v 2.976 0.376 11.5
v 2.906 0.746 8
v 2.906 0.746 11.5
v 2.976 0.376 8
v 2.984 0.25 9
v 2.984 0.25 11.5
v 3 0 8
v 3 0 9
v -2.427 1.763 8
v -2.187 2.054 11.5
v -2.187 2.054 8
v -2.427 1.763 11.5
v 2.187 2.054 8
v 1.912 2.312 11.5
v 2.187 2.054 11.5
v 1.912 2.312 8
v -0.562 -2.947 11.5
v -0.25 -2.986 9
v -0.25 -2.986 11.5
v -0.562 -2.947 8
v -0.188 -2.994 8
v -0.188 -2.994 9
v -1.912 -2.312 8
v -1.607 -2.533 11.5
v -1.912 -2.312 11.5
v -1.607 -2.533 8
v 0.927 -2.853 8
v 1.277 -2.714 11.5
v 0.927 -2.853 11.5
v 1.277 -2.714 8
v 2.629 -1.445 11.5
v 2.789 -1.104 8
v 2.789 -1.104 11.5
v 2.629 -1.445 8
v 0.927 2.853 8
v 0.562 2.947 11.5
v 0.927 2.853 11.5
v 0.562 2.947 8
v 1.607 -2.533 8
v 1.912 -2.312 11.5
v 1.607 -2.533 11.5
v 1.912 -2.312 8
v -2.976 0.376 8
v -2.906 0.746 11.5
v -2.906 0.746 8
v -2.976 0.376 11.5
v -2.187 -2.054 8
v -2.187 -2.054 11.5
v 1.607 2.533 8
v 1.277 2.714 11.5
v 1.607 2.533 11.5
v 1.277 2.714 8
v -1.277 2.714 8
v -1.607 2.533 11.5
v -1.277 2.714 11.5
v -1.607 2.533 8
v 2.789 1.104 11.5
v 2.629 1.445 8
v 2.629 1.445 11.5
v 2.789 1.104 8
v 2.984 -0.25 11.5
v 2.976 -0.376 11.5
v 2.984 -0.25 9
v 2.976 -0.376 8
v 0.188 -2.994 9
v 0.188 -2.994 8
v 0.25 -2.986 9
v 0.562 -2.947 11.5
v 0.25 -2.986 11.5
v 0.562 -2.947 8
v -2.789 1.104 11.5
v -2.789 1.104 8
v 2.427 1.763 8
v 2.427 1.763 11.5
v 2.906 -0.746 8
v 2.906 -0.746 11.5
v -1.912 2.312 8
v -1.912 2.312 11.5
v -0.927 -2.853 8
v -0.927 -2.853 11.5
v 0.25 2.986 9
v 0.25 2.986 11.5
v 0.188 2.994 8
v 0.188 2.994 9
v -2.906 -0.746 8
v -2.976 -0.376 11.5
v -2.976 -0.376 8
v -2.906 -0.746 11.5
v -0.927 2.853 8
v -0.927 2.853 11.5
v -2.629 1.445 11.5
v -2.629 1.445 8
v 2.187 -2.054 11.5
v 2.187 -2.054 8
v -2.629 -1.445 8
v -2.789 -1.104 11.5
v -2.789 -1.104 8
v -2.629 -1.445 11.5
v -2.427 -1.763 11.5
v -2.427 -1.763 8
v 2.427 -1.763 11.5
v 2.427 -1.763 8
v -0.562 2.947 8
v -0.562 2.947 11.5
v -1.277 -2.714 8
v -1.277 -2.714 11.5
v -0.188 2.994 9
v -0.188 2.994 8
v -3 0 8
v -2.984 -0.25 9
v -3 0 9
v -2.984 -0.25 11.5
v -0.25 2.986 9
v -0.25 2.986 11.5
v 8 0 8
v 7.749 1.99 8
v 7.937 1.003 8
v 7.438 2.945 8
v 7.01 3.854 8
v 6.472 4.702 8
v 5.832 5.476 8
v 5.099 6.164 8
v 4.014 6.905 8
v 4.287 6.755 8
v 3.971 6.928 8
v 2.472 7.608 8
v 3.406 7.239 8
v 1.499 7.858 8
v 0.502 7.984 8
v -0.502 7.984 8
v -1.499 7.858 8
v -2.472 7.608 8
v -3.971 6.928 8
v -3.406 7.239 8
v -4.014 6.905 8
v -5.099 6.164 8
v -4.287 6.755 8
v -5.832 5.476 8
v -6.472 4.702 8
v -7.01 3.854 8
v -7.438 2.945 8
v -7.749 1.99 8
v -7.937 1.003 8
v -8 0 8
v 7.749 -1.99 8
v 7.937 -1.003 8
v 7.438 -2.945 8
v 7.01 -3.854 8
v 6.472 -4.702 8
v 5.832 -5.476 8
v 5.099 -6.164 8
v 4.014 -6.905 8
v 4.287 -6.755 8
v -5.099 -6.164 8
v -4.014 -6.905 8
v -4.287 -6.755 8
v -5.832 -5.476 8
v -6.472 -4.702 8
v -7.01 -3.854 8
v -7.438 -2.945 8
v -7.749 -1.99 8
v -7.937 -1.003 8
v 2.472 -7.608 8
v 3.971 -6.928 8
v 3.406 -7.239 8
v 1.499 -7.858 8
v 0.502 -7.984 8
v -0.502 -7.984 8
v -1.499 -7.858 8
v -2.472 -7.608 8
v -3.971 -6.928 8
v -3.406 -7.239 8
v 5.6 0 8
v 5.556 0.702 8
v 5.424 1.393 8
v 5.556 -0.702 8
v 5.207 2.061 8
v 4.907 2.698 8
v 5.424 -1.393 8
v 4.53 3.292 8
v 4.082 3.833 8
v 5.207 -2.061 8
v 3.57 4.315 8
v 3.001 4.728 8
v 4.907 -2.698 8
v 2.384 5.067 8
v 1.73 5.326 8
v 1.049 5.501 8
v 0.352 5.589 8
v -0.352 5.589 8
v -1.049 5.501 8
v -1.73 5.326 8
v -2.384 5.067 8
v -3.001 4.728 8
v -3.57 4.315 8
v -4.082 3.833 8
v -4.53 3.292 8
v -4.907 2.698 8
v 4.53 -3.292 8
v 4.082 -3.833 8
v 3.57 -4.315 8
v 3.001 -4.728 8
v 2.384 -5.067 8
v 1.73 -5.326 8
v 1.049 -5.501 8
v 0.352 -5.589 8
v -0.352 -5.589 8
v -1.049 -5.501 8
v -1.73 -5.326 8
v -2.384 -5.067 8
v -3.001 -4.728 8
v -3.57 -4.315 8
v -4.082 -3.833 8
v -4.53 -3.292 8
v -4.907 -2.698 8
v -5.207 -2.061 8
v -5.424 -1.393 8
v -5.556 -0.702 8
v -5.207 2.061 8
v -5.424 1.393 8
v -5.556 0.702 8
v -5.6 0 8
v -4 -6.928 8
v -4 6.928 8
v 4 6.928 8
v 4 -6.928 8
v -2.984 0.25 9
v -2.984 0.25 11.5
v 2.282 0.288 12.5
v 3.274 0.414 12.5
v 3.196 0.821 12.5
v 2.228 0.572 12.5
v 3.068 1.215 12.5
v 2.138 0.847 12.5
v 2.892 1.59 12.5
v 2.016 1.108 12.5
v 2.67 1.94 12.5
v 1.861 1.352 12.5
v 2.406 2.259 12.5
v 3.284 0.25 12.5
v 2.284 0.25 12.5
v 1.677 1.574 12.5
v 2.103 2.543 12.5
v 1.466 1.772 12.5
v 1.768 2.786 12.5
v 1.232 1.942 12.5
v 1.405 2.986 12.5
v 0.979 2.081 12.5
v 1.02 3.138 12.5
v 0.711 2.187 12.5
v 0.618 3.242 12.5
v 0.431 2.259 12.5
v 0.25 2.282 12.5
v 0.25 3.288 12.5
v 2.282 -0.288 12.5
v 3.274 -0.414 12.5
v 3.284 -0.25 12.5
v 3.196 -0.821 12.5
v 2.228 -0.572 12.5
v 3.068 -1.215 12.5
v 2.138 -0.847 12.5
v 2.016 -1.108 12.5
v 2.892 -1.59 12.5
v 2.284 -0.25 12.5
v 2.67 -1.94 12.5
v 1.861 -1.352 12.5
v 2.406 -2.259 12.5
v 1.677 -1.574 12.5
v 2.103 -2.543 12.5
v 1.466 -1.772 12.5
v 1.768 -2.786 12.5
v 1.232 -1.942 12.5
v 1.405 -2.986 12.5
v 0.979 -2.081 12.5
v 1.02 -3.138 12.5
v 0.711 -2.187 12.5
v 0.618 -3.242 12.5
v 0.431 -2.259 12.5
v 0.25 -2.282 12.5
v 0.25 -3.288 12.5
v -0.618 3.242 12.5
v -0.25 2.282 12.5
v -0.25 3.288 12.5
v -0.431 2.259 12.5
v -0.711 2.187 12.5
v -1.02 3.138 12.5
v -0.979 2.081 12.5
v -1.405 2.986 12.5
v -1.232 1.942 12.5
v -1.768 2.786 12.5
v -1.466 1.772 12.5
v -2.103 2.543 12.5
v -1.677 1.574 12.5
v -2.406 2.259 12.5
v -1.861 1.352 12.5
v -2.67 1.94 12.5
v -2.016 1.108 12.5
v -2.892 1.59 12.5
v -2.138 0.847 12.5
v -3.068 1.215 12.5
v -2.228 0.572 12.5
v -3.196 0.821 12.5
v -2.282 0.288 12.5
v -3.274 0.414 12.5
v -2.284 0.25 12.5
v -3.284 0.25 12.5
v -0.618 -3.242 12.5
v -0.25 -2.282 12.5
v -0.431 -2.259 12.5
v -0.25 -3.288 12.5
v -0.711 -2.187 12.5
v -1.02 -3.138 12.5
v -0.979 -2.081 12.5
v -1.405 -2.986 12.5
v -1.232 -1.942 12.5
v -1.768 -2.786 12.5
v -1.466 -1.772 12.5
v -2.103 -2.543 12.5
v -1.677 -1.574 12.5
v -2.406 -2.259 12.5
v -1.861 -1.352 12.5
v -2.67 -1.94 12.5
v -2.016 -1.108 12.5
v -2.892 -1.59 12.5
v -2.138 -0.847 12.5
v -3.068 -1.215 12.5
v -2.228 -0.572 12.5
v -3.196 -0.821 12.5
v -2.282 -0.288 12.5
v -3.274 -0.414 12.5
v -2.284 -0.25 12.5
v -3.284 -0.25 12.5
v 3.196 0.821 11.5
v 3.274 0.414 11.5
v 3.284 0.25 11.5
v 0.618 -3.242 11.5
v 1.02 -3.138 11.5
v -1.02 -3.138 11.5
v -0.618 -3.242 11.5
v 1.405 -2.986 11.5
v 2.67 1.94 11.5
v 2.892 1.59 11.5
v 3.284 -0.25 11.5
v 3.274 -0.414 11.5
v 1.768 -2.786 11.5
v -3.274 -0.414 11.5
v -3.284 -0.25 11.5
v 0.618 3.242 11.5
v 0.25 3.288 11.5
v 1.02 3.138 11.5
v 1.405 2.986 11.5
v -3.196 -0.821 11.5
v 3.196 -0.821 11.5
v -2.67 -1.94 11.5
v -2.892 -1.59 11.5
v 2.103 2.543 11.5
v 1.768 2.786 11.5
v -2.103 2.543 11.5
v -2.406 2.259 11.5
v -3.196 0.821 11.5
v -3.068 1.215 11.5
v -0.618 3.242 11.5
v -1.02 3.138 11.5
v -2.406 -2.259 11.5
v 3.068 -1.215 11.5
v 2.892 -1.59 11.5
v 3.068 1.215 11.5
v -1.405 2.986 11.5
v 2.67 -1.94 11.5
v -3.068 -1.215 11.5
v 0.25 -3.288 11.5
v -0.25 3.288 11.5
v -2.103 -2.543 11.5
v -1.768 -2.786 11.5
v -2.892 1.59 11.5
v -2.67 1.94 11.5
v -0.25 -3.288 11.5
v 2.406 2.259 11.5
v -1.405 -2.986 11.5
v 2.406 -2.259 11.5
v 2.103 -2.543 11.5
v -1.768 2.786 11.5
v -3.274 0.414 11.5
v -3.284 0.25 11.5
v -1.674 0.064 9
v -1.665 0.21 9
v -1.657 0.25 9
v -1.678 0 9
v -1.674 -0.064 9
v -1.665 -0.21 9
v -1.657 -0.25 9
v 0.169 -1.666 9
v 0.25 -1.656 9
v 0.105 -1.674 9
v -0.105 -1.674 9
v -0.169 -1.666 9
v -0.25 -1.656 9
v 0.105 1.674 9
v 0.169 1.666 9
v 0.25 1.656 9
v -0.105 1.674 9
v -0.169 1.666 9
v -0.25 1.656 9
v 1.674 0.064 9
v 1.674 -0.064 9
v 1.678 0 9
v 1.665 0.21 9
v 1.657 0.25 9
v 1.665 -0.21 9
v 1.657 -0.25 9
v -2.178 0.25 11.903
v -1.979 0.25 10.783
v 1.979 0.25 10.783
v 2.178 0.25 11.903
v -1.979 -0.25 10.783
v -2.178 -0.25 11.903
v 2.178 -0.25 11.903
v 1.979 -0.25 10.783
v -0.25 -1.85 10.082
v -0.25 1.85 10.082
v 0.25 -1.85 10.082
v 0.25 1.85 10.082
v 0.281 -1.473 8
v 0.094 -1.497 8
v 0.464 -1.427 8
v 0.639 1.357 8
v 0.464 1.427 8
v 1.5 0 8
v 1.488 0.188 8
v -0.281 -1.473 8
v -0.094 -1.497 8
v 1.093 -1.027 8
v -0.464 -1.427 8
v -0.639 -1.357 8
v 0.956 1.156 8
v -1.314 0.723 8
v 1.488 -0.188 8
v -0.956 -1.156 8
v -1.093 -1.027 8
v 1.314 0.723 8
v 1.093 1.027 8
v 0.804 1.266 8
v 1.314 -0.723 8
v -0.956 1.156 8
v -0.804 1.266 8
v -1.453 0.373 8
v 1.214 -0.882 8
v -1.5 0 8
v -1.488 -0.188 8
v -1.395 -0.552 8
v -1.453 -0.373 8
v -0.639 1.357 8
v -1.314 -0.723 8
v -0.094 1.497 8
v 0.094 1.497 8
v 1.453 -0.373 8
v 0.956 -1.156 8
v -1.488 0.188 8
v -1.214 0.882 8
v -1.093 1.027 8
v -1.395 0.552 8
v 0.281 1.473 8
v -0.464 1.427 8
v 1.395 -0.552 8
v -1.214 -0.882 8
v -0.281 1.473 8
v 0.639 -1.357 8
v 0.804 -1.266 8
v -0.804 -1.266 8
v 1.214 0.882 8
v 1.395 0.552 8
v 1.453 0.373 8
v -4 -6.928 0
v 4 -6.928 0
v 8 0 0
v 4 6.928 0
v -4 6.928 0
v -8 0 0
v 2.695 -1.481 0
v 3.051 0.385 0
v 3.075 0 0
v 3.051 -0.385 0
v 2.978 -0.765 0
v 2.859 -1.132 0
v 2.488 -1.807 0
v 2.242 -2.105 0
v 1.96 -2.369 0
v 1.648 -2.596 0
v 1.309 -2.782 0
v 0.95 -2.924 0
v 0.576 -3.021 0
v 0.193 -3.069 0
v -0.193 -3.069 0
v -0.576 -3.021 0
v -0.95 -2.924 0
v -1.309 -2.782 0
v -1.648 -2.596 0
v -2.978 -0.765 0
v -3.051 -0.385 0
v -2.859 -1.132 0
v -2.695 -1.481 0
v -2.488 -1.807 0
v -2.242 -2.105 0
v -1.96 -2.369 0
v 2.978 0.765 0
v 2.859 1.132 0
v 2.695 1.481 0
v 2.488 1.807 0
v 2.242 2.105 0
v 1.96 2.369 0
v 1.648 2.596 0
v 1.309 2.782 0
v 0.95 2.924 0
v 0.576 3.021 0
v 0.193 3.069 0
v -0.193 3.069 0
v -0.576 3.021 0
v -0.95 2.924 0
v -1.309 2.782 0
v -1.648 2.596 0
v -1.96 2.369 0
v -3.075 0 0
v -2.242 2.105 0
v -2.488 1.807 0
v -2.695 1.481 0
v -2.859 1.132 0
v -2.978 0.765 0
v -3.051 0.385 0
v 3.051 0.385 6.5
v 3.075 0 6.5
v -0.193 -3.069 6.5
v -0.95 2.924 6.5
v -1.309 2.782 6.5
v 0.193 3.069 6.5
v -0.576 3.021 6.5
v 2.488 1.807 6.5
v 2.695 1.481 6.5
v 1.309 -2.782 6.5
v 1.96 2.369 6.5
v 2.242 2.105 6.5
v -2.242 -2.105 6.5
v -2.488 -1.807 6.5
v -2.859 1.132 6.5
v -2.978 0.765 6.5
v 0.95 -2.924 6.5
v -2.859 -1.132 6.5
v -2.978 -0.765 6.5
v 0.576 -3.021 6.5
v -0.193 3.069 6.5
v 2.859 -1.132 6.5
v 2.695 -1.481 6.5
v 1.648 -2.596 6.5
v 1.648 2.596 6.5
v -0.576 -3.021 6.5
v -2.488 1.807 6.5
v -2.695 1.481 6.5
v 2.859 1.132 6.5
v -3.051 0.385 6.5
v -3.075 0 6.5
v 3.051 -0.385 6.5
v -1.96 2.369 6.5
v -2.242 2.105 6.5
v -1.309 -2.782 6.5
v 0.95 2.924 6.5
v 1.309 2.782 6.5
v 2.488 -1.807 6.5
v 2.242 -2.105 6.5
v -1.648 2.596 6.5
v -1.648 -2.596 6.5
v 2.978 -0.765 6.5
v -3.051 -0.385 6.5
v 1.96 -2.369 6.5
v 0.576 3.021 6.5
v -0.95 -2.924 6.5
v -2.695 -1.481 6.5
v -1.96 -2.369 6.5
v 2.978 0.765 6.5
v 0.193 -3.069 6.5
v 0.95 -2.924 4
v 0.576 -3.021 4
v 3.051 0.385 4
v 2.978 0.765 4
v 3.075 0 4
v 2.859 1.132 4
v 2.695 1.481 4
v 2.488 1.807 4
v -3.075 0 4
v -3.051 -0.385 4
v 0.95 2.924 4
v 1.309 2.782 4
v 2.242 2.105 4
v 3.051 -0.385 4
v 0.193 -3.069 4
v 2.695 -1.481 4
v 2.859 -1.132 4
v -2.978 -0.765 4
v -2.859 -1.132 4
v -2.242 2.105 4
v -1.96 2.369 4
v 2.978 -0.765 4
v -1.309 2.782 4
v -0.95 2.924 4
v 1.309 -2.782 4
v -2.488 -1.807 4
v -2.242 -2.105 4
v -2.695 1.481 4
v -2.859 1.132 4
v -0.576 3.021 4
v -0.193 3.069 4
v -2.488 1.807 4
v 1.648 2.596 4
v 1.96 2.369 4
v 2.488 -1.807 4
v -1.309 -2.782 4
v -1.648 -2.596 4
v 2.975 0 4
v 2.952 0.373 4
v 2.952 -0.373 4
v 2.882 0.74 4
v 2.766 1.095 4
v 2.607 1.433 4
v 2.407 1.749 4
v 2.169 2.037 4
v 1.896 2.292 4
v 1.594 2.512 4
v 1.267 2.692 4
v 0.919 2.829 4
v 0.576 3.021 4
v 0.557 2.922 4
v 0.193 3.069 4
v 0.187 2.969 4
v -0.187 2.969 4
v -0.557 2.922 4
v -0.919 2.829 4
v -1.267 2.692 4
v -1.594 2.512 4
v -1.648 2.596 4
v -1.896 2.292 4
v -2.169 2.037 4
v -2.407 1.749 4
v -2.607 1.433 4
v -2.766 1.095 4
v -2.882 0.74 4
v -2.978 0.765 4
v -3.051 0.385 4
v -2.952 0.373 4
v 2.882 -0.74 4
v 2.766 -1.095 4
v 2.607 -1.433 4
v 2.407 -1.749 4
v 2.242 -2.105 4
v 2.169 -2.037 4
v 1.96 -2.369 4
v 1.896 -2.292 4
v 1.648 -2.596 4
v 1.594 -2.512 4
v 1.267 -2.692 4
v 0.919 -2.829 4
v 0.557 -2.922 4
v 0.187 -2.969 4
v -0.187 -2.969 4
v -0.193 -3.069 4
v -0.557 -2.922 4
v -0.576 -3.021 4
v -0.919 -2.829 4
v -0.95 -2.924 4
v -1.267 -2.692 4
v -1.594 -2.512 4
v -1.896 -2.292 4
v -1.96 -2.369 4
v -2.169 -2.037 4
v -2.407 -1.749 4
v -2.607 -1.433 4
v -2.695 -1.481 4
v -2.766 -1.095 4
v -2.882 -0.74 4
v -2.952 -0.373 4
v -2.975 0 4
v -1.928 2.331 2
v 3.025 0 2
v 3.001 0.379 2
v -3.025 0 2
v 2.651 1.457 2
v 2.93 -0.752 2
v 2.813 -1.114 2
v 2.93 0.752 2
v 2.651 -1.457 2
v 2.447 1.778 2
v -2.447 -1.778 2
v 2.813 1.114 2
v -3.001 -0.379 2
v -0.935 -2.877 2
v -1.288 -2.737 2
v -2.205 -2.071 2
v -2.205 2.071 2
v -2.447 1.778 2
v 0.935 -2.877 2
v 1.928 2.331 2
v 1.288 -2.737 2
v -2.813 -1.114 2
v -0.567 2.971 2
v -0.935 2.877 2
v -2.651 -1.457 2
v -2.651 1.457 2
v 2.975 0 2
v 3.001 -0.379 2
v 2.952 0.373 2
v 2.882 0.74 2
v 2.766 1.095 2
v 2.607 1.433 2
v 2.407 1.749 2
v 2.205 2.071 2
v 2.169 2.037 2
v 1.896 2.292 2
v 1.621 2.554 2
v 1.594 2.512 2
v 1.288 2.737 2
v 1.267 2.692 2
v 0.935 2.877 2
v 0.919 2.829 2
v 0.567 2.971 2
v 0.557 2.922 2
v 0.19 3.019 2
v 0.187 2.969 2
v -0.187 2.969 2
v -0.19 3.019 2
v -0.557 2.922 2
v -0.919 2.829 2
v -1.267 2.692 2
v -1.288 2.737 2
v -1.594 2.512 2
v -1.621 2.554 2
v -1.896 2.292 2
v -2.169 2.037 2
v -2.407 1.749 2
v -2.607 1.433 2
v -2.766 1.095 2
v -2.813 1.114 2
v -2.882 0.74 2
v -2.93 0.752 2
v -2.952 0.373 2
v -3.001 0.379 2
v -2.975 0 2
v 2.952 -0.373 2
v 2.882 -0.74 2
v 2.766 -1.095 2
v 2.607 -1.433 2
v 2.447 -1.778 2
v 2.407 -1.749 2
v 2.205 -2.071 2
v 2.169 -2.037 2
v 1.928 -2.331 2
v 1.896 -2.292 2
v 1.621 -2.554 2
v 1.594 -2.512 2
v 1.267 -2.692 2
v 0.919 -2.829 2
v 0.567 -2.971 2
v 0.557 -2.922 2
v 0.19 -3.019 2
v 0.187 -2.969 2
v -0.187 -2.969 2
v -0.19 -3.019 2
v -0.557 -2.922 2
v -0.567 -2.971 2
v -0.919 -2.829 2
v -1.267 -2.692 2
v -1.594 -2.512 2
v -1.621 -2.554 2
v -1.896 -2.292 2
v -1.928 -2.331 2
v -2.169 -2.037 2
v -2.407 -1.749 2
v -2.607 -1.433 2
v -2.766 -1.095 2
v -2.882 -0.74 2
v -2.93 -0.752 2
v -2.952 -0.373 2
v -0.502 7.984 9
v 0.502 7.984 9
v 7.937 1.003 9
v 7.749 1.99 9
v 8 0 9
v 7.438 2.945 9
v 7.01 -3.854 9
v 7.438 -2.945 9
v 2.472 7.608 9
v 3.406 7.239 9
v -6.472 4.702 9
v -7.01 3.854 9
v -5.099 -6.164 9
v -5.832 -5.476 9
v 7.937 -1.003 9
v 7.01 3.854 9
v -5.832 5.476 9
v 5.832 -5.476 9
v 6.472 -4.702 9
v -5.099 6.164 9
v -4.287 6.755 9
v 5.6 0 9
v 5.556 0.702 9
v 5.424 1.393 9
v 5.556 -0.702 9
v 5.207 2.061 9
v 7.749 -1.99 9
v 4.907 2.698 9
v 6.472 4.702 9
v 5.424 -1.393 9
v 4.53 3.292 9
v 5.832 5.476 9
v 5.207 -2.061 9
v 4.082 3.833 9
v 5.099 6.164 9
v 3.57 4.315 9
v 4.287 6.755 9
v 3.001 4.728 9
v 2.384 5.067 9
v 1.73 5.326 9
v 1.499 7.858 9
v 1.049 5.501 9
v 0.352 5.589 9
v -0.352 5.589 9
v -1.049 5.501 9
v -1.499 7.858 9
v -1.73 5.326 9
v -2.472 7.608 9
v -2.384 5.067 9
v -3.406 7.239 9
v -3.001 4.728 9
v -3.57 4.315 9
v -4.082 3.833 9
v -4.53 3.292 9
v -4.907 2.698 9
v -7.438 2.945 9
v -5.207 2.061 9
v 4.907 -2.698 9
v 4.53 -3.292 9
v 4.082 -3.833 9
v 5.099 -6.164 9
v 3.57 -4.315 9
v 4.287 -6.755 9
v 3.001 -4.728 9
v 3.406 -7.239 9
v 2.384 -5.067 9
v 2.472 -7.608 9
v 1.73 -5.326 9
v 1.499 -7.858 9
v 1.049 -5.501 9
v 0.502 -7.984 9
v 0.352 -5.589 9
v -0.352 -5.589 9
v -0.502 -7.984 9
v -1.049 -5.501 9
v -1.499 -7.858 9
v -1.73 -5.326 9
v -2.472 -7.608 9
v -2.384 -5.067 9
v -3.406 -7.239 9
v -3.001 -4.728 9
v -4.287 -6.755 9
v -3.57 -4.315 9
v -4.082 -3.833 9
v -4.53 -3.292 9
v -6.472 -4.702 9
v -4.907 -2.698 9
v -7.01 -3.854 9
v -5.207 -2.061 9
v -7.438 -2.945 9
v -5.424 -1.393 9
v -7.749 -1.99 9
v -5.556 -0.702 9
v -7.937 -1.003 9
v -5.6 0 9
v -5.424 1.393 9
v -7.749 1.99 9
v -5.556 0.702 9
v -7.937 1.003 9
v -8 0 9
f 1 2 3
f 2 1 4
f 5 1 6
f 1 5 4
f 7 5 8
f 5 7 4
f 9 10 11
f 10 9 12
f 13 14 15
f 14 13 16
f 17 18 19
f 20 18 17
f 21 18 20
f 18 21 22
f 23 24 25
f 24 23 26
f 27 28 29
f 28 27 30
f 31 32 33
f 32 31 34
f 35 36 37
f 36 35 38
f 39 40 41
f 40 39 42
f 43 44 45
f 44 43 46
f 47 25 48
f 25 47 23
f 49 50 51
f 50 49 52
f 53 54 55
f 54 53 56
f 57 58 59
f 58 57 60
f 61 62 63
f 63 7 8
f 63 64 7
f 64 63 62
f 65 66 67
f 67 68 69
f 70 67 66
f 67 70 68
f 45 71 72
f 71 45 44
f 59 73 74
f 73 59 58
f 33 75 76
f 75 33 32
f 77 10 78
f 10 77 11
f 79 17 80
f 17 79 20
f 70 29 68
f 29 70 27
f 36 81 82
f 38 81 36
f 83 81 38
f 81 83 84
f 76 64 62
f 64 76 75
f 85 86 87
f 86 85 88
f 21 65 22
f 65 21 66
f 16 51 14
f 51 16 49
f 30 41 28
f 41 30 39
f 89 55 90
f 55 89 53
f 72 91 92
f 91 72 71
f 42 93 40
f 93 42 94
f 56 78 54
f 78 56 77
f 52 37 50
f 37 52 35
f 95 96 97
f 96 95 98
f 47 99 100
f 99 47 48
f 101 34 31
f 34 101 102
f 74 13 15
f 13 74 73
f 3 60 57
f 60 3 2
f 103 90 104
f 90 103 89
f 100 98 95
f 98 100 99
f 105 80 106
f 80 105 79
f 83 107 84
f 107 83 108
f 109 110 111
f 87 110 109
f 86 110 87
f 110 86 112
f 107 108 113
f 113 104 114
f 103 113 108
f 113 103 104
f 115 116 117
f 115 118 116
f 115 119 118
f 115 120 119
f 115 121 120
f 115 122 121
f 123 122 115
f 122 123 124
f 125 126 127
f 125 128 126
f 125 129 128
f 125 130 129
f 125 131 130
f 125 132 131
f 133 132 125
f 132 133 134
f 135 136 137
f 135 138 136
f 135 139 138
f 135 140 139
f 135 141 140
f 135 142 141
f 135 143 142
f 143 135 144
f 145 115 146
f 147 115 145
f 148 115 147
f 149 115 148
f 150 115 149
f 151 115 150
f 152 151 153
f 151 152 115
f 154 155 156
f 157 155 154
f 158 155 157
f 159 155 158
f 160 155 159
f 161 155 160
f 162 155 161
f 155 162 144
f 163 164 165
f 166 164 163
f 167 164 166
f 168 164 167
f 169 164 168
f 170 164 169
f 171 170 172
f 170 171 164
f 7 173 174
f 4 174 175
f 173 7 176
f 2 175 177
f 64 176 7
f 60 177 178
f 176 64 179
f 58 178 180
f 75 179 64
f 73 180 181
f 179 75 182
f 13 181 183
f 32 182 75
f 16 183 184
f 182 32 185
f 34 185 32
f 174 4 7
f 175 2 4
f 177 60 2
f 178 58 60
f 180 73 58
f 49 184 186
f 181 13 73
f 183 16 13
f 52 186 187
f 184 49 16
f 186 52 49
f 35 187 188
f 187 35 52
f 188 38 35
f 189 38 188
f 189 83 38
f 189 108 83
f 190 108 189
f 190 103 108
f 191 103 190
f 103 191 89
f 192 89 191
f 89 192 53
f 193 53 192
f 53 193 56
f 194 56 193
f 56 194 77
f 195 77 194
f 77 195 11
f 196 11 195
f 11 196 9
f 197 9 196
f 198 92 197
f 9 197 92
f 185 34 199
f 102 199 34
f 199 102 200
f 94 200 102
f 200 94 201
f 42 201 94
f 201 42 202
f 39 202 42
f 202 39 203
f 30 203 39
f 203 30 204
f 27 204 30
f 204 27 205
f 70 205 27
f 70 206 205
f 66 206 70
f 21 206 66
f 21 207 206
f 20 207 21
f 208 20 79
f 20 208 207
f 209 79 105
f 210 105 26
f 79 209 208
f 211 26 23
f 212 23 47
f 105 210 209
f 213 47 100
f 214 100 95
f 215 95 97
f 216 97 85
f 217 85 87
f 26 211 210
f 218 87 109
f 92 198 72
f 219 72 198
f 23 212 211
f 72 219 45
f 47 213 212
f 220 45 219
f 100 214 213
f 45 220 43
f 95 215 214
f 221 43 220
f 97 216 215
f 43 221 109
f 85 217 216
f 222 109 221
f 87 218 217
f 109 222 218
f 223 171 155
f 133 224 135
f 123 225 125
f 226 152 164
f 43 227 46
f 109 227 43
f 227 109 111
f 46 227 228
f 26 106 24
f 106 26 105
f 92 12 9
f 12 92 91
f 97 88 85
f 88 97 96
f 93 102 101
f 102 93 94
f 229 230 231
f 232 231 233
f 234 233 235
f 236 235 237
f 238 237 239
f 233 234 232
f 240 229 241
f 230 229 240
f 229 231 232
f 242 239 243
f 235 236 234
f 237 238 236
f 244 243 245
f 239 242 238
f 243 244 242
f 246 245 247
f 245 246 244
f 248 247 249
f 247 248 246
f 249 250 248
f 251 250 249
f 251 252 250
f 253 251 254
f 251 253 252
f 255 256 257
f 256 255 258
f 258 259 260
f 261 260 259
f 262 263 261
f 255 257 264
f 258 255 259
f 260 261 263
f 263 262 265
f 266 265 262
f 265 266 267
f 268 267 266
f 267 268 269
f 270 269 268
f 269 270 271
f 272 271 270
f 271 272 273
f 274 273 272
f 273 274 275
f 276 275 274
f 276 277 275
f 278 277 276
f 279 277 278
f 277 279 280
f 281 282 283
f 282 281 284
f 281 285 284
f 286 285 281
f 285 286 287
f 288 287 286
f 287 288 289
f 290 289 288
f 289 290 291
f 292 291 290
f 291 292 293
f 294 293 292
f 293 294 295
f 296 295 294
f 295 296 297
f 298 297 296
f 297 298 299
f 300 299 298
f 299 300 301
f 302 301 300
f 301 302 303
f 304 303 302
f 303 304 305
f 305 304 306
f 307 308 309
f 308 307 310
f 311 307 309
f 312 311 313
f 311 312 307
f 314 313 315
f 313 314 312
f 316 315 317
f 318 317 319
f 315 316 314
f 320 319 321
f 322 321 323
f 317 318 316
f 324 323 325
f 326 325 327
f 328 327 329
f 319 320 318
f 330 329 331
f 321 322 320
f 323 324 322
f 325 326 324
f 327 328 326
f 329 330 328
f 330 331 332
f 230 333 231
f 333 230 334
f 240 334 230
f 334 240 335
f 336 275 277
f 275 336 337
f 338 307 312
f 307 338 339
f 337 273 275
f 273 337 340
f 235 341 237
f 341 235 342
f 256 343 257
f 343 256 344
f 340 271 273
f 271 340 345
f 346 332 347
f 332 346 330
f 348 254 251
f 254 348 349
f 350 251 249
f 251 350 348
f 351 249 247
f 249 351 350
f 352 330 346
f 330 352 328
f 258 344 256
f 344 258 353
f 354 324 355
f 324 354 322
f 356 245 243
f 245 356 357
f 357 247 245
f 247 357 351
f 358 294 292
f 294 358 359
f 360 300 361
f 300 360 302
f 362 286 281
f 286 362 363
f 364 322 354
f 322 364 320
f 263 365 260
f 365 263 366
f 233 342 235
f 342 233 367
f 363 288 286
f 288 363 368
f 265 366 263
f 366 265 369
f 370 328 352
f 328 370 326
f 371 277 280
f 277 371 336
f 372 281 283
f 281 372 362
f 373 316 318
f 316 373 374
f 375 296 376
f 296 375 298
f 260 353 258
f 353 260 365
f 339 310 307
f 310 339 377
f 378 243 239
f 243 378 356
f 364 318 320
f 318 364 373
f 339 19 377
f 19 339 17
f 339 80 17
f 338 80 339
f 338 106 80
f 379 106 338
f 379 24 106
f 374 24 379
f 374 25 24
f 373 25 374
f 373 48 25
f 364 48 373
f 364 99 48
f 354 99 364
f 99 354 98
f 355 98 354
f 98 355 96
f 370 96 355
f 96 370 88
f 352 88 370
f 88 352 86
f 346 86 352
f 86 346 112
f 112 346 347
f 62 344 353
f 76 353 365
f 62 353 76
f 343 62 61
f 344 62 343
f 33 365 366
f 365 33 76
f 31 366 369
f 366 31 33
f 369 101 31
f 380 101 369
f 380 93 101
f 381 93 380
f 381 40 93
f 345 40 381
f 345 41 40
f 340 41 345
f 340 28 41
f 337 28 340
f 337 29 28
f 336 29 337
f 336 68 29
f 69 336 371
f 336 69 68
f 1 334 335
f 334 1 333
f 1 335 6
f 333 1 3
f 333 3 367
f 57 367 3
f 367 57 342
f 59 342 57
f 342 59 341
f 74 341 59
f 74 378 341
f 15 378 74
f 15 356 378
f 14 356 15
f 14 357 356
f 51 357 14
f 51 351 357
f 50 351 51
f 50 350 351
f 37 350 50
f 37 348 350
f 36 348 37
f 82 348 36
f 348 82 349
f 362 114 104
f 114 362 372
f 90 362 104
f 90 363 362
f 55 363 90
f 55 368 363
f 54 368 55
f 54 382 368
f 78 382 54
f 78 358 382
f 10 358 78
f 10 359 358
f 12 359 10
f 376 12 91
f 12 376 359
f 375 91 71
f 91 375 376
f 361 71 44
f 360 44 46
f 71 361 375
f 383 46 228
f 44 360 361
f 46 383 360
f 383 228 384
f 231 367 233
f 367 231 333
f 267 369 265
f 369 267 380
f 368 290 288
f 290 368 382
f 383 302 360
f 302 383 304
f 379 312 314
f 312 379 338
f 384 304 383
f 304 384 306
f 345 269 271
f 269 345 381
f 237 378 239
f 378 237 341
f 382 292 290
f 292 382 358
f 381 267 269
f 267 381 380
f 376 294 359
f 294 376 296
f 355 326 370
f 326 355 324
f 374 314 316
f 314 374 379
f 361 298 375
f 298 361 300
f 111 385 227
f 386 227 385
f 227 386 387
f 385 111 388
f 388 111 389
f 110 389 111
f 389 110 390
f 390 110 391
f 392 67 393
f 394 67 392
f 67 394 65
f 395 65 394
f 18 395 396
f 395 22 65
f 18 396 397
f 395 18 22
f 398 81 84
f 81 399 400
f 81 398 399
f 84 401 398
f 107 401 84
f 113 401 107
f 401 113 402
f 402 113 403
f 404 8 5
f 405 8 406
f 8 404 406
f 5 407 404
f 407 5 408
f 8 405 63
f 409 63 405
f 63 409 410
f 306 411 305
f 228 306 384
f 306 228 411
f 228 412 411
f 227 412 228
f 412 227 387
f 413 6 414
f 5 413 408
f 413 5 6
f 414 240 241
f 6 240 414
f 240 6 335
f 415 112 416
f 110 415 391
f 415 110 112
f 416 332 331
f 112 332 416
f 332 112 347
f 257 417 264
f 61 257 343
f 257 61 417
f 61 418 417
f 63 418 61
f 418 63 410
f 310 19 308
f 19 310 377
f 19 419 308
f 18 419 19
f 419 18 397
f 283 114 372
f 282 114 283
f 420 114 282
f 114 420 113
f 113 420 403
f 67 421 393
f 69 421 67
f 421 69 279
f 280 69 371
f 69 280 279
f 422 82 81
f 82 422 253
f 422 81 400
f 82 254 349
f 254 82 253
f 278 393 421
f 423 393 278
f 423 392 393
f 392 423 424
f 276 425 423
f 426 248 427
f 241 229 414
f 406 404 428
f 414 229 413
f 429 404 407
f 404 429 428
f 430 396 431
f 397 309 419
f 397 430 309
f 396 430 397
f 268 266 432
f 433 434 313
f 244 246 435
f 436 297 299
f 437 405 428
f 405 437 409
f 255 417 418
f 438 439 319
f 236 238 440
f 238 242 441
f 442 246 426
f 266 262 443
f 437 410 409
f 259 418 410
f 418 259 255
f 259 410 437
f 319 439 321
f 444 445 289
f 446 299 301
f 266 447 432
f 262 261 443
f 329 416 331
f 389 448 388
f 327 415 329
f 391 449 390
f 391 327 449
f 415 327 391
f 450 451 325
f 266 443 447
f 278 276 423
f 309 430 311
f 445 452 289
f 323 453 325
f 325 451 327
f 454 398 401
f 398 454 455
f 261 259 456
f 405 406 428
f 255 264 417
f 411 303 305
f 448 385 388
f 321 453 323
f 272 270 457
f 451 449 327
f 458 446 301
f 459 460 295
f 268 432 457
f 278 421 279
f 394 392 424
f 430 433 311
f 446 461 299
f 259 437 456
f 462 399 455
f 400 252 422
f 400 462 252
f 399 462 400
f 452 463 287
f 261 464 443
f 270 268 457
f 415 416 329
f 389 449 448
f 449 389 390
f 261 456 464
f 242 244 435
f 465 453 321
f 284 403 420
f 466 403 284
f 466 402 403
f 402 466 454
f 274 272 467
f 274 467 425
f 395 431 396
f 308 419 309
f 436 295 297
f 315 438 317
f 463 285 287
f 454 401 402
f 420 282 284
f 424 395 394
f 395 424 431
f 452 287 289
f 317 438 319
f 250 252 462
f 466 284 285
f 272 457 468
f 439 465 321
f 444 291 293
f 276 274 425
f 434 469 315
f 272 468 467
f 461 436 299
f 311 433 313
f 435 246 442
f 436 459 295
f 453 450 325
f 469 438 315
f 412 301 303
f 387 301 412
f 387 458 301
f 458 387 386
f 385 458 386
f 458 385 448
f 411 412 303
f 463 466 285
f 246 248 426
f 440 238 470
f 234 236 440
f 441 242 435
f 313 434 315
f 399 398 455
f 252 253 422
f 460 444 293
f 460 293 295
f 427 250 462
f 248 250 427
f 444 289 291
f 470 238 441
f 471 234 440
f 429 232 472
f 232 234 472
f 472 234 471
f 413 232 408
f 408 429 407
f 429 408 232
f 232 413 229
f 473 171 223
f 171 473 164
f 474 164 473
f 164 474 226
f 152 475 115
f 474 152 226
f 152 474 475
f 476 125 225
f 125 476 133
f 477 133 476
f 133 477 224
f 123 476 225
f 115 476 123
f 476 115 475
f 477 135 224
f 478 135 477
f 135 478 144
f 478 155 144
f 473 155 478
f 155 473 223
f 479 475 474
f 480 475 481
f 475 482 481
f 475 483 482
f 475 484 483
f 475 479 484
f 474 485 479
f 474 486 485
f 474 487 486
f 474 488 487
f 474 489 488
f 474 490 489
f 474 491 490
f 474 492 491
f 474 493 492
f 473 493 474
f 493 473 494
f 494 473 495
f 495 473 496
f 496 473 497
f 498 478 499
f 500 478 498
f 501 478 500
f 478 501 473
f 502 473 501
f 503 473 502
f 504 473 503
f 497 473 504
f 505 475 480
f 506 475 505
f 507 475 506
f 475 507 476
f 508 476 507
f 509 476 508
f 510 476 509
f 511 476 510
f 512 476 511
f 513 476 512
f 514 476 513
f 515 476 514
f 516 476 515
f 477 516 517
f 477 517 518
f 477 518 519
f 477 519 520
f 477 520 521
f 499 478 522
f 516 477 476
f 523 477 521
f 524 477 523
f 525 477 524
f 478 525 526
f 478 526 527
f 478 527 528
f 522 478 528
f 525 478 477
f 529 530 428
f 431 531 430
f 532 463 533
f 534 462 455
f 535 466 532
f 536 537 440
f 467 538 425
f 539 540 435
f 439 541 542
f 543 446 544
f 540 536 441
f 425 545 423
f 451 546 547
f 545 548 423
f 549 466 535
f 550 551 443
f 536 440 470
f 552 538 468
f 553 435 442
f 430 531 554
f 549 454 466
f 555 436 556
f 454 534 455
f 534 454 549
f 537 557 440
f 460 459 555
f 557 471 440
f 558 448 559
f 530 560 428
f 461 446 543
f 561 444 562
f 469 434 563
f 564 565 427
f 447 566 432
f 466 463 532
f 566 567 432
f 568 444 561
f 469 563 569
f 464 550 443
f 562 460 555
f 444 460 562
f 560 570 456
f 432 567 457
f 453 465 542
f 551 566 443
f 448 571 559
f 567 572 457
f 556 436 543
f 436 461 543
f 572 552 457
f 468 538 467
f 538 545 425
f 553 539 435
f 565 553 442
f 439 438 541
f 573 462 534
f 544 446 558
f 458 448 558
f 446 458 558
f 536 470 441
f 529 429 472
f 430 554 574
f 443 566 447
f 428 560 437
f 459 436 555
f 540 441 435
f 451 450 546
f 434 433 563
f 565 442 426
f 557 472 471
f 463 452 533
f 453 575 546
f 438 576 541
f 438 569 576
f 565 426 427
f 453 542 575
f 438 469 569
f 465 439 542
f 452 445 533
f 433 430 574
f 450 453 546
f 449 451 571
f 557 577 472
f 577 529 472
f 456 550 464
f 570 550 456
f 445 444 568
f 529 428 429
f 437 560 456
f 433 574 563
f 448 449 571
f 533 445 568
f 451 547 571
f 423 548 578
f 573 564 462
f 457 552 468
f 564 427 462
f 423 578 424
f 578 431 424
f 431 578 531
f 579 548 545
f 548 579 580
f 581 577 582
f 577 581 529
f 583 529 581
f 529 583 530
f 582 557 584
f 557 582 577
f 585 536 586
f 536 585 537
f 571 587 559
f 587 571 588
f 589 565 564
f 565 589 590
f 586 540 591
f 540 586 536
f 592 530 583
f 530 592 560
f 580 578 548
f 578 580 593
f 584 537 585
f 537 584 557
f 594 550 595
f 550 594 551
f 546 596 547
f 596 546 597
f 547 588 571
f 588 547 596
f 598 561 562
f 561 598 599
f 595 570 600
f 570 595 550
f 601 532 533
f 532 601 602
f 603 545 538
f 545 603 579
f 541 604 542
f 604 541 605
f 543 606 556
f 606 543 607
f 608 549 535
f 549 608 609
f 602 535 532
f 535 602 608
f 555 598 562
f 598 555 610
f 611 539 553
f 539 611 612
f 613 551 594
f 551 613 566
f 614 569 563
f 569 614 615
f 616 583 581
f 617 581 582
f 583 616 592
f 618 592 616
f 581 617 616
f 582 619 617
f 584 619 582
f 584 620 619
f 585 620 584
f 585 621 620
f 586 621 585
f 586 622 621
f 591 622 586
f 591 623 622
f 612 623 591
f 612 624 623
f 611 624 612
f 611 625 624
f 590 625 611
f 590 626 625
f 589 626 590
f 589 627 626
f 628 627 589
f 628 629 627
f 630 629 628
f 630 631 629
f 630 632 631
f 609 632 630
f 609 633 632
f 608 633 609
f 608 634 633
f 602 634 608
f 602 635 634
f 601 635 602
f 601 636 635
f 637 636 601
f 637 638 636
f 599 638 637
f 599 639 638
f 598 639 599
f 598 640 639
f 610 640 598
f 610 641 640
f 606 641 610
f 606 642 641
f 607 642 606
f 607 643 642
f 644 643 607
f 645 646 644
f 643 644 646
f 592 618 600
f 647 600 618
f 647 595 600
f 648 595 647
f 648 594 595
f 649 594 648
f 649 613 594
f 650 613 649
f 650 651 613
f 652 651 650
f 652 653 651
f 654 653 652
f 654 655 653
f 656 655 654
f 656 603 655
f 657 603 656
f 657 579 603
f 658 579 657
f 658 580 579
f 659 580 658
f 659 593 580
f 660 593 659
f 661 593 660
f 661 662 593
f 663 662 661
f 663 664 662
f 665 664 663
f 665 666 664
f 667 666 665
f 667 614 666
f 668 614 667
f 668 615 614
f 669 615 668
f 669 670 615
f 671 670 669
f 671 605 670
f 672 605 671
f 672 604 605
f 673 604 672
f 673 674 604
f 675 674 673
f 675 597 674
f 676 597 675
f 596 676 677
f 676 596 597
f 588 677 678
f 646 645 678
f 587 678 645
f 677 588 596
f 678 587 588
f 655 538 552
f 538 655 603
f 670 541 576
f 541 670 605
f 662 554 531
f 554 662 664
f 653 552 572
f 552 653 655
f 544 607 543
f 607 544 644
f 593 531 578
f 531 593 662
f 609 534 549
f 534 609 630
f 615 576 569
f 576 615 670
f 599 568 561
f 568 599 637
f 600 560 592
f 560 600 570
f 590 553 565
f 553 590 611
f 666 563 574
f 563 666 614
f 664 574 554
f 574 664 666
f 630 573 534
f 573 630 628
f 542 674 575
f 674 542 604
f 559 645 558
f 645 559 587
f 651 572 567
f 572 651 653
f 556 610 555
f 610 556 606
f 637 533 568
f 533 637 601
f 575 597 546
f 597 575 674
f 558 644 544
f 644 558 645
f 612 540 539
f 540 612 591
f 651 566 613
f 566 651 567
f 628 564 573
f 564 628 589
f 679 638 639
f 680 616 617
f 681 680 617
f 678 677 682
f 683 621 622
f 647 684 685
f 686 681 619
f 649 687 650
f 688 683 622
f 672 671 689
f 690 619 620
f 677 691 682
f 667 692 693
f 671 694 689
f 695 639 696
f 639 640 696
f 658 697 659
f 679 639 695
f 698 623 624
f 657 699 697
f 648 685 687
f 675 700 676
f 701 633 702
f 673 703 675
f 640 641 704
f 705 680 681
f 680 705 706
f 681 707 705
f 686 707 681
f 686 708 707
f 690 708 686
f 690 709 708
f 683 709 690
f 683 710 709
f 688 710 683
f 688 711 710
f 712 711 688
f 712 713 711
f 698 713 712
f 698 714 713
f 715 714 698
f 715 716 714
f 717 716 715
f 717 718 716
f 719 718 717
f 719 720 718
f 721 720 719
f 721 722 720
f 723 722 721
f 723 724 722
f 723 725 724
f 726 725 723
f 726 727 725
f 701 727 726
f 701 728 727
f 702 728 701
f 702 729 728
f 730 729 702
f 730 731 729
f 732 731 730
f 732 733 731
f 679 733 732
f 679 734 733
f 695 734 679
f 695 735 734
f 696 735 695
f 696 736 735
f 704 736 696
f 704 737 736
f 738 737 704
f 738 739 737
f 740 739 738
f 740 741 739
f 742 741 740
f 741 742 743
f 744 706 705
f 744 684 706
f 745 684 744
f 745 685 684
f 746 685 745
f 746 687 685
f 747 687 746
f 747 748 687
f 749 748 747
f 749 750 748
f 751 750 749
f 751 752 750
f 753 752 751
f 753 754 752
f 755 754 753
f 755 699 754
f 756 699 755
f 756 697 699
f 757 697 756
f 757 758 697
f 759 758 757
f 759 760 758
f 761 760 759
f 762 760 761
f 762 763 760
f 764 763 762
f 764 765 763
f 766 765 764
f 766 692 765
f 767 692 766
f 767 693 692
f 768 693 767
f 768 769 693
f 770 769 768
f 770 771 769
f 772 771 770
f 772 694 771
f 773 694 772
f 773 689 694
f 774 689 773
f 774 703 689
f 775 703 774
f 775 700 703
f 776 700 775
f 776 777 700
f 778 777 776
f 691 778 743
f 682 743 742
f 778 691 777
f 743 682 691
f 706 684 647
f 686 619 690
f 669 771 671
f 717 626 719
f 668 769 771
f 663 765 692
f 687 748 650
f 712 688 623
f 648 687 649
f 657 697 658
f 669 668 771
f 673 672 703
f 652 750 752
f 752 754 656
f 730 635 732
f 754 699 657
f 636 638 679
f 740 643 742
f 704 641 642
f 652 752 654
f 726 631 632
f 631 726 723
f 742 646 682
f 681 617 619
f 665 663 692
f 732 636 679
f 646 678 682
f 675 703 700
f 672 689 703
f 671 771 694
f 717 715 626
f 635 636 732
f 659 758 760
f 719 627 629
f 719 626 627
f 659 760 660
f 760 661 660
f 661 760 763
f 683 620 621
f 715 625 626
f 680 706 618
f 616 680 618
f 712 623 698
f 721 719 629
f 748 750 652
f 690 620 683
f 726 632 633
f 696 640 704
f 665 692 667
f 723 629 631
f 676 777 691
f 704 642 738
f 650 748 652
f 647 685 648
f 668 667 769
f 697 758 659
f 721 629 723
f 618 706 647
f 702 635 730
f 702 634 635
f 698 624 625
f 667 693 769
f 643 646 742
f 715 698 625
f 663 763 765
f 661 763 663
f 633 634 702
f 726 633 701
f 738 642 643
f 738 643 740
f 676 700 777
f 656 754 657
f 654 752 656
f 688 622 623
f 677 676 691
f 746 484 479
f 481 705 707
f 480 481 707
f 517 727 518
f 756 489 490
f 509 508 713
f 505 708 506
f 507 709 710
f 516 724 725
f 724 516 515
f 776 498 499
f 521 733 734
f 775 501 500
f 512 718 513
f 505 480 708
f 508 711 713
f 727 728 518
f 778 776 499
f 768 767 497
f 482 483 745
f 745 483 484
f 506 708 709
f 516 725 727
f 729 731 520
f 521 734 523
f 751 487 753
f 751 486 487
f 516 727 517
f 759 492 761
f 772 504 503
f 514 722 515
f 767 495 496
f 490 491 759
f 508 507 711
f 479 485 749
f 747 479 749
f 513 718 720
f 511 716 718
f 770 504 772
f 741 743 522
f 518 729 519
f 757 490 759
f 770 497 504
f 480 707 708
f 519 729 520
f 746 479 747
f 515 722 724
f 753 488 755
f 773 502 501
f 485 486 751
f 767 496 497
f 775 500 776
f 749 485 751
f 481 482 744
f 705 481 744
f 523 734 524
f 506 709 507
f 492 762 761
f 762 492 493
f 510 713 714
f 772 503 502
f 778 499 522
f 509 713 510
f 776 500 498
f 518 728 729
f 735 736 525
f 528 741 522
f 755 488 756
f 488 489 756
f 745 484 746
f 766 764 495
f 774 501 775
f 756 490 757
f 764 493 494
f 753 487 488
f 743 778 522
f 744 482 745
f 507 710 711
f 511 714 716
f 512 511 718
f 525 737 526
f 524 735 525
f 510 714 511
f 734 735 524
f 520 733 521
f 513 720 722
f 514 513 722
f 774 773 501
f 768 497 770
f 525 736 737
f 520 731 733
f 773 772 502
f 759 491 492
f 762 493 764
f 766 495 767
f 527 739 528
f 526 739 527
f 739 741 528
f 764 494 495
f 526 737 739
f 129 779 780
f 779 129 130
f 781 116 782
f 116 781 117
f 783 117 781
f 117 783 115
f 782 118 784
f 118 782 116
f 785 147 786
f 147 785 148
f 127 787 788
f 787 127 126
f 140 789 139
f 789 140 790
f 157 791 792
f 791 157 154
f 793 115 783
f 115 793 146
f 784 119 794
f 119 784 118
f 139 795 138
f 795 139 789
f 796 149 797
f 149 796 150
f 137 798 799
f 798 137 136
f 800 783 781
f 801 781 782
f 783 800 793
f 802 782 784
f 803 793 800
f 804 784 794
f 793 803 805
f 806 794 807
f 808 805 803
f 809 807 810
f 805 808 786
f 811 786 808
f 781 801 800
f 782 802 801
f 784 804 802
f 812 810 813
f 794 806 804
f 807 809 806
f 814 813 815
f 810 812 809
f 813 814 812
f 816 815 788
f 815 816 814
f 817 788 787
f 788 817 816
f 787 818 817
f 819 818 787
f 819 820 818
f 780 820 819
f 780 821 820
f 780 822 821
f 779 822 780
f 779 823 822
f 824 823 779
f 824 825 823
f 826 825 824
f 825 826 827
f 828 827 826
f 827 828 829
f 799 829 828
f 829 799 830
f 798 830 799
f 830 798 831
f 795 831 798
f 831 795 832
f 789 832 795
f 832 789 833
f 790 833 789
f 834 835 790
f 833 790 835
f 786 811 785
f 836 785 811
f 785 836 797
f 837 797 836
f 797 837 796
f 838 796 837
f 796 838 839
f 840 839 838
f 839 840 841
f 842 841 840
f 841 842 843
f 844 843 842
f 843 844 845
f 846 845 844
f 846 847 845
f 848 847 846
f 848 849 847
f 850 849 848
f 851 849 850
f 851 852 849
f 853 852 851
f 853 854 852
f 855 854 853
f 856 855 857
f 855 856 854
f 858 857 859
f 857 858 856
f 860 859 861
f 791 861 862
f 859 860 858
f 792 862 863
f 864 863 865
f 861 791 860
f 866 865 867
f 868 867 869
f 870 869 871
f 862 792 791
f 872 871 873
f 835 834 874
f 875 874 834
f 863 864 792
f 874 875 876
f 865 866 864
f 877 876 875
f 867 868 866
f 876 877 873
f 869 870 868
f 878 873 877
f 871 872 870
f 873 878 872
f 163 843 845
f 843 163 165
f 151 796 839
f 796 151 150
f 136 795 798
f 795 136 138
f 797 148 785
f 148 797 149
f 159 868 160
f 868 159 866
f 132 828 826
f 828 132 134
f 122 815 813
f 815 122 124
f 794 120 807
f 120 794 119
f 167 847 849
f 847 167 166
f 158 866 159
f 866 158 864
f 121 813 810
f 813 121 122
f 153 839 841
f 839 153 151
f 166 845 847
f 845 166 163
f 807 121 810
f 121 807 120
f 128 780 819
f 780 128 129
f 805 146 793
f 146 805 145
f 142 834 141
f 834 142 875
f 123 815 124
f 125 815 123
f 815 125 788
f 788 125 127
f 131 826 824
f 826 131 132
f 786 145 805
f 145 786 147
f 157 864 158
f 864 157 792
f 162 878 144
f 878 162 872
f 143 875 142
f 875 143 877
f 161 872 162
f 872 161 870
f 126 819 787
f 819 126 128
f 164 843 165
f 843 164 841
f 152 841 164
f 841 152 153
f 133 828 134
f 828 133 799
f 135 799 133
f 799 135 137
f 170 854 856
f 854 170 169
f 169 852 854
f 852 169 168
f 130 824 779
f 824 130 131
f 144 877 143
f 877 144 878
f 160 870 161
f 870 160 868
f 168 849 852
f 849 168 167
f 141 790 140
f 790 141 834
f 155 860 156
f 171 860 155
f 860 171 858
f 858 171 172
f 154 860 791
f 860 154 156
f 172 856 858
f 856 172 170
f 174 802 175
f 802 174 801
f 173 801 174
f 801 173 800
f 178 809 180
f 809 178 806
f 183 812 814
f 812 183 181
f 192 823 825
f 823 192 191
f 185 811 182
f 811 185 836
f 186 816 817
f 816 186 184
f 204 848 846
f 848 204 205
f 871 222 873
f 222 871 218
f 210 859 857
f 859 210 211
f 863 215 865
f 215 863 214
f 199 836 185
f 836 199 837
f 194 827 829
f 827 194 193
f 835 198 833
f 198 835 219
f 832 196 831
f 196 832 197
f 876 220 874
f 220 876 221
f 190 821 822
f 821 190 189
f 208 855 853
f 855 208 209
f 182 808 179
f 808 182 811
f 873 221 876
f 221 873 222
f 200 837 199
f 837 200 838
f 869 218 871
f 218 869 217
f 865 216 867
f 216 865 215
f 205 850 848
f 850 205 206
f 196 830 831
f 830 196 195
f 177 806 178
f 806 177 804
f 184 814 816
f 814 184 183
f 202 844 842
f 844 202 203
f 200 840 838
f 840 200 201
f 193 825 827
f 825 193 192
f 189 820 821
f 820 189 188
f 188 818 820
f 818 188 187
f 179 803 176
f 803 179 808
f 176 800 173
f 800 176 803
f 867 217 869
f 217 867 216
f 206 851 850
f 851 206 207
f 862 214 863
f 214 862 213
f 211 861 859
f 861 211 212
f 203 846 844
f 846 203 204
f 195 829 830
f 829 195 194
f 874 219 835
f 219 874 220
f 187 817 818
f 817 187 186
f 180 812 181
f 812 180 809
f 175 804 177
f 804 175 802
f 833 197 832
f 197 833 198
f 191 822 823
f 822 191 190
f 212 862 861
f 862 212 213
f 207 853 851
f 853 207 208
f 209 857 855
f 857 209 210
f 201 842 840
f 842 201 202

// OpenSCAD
// file: adapter.scad
module adapter_grommet(filament_r=1.5) {

     grommet_id = 6.1;
     grommet_thick = 3.5;

     pin_length = grommet_thick;

     pin_or = grommet_id / 2;
     pin_ir = pin_or - 1.5;
     bump_or = pin_or + 0.25;

     $fn = 50;

     difference() {
	  // outer shape of pin, with bump on rim
	  union() {
	       cylinder(pin_length + 1, r=3);
	       translate([0, 0, pin_length]) {
		    cylinder(1, r=bump_or);
	       };
	  }

	  // slots for relief
	  translate([0, 0, 4]) {
	       cube([10, 0.5, 6], center=true);

	       rotate([0, 0, 90]) {
		    cube([10, 0.5, 6], center=true);
	       };
	  };

	  cylinder(pin_length + 1, filament_r, pin_or - 0.75);
     };
}


module adapter_tube(tubing_od=4.1, pinch=0.1, filament_r=1.5) {

     hole_r = tubing_od / 2;
     squeeze_r = hole_r - (pinch / 2);
     spacious_r = hole_r + (pinch / 2);

     $fn = 50;

     difference() {
	  // I like the look of a hex nut for the body of the adapter
	  cylinder(8, r=8, $fn=6);

	  // upper ceiling contracts to the grommet adapter size
	  translate([0, 0, 6.5]) {
	       cylinder(1.5, spacious_r, filament_r);
	  };

	  // main space
	  translate([0, 0, 4]) {
	       cylinder(2.5, r=spacious_r);
	  };

	  // inner flange
	  translate([0, 0, 2]) {
	       cylinder(2, hole_r, squeeze_r);
	  };

	  // bottom flange
	  cylinder(2, spacious_r, squeeze_r);
     };

     // a little ring that fits over the protrusion of the grommet
     translate([0, 0, 8]) {
	  difference() {
	       cylinder(1, r=8);
	       translate([0, 0, -1]) {
		    cylinder(3, r=5.6);
	       };
	  };
     };
}


module adapter(tubing_od=4.1) {
     union() {
	  translate([0, 0, 8]) {
	       adapter_grommet();
	  };
	  adapter_tube(tubing_od);
     };
}


adapter();


// The end.
// main file
use <adapter.scad>;

adapter(tubing_od=6.05);


// The end.
